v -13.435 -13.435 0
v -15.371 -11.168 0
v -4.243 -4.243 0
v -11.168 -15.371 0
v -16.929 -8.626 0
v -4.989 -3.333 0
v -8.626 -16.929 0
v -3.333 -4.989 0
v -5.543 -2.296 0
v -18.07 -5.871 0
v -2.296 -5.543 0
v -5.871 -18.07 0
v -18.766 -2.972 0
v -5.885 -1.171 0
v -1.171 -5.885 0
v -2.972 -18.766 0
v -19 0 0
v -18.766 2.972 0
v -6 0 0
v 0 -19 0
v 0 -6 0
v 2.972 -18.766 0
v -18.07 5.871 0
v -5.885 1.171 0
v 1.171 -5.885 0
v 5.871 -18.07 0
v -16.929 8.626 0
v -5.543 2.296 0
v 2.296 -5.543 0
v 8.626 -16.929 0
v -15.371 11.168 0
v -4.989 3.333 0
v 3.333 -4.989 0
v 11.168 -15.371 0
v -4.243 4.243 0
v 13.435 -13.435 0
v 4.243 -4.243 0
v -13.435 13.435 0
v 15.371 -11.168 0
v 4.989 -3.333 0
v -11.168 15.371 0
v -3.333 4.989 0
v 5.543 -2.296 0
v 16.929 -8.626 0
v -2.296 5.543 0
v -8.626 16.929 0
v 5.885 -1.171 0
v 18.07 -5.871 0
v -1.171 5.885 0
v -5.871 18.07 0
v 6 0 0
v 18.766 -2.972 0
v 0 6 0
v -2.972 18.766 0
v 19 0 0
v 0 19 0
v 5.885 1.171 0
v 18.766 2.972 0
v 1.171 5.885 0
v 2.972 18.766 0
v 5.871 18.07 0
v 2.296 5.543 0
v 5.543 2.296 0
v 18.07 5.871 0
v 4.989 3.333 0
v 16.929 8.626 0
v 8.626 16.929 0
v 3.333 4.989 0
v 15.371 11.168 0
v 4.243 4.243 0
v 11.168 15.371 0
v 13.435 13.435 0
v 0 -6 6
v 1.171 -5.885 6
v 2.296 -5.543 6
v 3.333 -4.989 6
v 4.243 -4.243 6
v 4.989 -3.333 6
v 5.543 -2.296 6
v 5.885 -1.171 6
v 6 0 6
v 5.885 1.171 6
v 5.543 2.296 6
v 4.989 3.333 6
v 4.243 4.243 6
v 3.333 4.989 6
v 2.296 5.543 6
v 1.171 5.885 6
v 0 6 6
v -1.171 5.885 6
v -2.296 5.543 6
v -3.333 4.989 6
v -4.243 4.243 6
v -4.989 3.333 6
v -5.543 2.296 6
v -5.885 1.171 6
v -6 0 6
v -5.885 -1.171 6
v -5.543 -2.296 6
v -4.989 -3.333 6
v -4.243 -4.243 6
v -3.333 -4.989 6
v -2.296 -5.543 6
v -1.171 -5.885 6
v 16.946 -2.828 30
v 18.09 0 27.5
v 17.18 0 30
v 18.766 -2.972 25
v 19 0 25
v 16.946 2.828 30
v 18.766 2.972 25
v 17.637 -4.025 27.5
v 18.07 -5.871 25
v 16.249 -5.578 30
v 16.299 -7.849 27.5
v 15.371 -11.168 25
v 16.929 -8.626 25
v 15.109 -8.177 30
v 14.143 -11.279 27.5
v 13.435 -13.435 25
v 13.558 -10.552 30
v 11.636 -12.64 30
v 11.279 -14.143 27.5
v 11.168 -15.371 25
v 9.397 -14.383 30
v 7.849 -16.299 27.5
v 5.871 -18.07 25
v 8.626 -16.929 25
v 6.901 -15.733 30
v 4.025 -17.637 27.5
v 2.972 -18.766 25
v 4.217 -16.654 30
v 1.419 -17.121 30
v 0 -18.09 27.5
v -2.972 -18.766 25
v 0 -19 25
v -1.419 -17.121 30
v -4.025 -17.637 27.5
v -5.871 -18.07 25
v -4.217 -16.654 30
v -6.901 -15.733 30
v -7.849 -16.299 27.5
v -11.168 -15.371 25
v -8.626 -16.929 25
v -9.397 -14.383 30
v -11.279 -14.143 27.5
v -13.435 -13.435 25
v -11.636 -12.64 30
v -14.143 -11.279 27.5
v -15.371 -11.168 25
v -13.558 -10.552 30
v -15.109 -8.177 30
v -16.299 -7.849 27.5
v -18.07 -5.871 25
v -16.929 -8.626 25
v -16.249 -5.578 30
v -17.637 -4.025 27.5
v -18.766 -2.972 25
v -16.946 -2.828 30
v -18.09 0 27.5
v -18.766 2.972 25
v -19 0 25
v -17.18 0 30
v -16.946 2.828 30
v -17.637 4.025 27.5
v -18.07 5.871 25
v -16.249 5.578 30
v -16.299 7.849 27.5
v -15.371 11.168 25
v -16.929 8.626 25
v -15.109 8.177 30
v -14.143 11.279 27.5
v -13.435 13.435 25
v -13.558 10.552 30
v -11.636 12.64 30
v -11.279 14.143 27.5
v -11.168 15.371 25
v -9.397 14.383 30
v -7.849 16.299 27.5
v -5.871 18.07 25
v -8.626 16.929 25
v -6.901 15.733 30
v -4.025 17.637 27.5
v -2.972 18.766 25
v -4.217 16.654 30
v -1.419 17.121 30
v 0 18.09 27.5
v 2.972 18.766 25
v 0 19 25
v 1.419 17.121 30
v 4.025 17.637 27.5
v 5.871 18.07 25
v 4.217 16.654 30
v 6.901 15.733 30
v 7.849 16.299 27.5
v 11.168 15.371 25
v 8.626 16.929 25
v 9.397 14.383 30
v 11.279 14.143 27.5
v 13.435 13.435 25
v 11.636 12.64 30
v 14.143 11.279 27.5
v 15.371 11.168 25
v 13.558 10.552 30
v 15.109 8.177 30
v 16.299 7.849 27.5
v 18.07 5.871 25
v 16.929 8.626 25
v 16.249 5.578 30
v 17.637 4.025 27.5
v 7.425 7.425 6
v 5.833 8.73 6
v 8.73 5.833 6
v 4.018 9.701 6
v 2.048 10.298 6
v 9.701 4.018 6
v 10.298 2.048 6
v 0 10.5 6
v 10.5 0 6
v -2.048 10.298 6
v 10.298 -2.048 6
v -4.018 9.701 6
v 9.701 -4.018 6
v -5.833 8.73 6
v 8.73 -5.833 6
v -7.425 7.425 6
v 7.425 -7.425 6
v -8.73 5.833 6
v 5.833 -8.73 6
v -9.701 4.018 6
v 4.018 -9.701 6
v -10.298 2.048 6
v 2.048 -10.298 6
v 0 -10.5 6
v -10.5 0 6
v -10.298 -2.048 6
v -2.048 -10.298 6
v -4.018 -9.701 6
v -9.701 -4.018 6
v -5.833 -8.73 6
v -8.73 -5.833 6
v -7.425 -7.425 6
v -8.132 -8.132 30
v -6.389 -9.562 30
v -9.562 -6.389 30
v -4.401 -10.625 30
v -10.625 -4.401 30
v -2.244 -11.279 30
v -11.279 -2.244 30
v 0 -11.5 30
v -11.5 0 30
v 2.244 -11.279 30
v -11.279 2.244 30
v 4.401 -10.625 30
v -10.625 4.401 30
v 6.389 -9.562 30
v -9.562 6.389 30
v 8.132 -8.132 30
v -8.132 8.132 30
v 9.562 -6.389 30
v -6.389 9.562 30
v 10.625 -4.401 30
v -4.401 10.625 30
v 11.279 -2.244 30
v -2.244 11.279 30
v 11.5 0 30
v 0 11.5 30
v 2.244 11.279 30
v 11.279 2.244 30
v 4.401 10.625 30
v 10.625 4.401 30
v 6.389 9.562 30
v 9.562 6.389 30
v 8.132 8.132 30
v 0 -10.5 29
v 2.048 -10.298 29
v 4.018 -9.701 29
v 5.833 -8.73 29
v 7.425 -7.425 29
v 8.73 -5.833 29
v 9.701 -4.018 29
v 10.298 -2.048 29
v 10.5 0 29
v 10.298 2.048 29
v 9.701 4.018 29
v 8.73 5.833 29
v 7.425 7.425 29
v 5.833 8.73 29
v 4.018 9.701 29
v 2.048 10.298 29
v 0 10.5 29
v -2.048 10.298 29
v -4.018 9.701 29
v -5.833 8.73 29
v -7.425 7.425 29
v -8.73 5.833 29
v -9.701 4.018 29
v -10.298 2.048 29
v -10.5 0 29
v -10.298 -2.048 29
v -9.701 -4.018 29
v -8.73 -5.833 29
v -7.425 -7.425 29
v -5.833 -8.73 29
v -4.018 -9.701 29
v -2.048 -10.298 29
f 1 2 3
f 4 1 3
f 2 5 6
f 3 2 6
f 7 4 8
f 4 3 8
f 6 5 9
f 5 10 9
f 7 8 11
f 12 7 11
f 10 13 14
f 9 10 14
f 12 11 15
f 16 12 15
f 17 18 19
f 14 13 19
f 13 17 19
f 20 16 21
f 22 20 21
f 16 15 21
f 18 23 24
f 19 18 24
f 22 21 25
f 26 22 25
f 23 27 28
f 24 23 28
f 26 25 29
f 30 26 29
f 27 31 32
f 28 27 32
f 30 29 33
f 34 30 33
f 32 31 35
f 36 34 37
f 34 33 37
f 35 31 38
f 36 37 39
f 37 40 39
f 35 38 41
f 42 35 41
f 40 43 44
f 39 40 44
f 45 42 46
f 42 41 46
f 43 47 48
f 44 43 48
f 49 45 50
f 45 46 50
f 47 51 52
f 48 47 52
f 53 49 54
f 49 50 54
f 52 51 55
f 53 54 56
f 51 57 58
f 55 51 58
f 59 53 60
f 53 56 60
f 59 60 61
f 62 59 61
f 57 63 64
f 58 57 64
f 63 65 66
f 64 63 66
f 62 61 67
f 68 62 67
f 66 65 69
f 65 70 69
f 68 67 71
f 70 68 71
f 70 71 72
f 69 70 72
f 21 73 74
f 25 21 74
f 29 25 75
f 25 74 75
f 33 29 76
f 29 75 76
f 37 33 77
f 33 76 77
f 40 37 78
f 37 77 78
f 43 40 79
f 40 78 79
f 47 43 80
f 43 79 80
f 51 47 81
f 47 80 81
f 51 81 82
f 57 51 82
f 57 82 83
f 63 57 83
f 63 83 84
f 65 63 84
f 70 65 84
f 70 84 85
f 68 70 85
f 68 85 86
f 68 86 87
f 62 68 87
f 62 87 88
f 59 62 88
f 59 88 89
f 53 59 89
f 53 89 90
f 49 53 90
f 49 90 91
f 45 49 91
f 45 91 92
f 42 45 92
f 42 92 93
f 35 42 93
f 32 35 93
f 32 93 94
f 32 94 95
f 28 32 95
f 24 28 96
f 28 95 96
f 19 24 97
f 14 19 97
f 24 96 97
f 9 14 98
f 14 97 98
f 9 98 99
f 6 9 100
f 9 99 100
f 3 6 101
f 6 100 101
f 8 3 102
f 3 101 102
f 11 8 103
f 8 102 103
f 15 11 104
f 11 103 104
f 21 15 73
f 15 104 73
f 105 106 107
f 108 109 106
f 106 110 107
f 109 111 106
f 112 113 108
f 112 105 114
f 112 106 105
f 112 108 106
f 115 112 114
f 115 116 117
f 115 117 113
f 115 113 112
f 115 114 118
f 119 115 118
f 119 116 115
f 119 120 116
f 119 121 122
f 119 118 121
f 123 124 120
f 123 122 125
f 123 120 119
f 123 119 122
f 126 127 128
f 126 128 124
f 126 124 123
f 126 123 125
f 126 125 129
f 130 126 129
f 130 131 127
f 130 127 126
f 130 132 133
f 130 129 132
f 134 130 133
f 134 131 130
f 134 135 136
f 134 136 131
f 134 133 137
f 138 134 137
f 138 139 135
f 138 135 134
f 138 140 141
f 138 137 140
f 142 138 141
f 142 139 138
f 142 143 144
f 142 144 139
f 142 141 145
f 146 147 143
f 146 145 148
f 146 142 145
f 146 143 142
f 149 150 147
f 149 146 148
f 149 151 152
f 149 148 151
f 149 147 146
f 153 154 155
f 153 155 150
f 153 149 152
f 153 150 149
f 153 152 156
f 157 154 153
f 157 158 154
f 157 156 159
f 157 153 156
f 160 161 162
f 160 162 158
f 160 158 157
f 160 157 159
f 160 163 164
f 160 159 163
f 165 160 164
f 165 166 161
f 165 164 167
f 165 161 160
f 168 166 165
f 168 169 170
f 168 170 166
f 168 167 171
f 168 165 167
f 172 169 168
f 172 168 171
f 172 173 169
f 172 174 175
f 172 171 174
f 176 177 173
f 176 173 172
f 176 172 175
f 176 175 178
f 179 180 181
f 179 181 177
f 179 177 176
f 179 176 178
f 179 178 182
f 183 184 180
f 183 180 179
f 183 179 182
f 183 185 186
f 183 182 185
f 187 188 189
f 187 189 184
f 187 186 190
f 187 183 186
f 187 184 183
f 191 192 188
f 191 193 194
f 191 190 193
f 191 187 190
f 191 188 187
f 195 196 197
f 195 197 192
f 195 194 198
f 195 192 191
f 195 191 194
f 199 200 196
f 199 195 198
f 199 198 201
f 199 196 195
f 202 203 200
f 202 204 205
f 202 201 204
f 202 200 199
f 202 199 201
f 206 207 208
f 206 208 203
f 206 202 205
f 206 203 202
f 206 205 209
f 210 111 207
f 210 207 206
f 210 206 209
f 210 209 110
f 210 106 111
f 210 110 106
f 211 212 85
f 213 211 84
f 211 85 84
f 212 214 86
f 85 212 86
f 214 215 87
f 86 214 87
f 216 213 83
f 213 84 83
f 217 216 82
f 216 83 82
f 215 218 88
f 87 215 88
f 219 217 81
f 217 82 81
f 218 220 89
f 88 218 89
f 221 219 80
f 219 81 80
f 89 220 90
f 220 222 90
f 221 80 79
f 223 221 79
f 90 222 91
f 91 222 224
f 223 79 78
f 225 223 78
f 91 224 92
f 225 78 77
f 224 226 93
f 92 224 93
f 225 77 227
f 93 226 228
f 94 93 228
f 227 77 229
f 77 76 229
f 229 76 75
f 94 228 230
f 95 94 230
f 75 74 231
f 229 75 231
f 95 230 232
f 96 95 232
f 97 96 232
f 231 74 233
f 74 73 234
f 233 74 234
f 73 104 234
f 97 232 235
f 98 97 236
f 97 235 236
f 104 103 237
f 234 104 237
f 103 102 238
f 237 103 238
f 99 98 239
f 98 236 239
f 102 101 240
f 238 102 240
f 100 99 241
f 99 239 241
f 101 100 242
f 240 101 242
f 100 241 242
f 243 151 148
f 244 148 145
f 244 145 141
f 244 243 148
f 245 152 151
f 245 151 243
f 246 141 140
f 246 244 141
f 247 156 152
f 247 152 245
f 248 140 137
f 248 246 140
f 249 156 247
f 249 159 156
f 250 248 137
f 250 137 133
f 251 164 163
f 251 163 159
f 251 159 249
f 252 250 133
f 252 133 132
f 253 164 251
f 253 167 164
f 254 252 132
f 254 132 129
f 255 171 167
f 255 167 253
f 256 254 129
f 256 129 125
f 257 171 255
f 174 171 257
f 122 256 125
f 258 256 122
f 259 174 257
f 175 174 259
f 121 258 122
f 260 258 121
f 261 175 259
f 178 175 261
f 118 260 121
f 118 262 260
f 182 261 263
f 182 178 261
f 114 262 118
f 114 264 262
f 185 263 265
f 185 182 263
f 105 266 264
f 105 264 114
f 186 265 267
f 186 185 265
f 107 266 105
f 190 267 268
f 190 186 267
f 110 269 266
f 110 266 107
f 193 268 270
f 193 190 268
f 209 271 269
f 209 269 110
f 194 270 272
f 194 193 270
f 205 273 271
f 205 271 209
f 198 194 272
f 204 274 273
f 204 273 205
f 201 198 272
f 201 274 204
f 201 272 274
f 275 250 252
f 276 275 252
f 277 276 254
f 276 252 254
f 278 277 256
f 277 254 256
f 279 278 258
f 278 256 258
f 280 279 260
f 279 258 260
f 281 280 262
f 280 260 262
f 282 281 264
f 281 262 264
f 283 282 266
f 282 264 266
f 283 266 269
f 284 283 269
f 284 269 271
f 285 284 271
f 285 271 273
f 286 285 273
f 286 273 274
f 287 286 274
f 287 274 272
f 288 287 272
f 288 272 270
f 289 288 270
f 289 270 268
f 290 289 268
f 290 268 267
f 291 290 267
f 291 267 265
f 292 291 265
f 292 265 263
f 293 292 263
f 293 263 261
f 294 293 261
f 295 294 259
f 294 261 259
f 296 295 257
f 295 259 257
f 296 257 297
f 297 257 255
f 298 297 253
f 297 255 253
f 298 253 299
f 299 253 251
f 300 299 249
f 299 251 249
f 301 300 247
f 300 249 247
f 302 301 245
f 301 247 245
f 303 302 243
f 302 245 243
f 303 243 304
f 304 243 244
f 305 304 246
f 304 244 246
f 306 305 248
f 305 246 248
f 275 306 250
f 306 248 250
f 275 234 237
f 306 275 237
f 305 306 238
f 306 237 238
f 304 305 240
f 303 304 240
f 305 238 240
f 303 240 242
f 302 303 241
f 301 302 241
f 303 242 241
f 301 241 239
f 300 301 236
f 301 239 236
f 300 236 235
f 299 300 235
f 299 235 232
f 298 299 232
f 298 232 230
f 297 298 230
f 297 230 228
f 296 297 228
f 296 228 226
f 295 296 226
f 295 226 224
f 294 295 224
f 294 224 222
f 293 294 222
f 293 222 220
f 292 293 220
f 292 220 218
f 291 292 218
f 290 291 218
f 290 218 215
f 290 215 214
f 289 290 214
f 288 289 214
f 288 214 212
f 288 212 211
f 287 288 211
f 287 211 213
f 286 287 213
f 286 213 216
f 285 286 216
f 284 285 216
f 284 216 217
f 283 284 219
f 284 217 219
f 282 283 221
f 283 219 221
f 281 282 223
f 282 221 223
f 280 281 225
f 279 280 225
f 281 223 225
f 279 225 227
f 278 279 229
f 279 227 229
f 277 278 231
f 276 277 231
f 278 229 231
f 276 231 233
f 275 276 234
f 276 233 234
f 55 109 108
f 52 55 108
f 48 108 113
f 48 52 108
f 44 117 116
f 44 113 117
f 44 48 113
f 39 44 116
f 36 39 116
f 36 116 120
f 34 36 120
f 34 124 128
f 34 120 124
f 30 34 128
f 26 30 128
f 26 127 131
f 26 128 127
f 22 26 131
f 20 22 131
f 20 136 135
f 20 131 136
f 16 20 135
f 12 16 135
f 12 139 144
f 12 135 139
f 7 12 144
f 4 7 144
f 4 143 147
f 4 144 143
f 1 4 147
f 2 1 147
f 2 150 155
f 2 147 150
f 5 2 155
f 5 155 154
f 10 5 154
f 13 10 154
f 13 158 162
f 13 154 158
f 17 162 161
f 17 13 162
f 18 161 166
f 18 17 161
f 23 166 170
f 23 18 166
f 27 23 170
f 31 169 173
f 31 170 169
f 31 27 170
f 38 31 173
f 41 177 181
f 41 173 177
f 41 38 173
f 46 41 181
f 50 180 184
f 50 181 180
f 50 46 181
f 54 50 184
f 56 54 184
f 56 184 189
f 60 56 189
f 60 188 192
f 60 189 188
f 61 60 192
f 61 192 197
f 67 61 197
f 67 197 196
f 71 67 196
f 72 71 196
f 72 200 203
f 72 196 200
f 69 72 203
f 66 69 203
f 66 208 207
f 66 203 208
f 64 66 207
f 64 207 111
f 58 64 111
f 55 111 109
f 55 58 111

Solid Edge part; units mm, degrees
sketch "Sketch1" plane through (0, 0, 0) normal (0, 0, 1) x (1, 0, 0)
  circle A0 centre (0, 0) radius 19
  dimension "D1" = 38
extrude "Protrusion1" add sketch "Sketch1" along normal blind 30
hole "Bohrung_1" at (0, 0, 30) direction (0, 0, -1) diameter 12 end through all
hole "Bohrung_2" at (0, 0, 30) direction (0, 0, -1) diameter 21 depth 24
chamfer "Fase_1" distance 1 angle 45 1 edges at (0, 10.5, 30)
chamfer "Fase_2" distance 5 angle 20 1 edges at (-19, 0, 30) measured on face at (10.5144, 15.8255, 24.7)
properties material "Aluminium, 1350"
